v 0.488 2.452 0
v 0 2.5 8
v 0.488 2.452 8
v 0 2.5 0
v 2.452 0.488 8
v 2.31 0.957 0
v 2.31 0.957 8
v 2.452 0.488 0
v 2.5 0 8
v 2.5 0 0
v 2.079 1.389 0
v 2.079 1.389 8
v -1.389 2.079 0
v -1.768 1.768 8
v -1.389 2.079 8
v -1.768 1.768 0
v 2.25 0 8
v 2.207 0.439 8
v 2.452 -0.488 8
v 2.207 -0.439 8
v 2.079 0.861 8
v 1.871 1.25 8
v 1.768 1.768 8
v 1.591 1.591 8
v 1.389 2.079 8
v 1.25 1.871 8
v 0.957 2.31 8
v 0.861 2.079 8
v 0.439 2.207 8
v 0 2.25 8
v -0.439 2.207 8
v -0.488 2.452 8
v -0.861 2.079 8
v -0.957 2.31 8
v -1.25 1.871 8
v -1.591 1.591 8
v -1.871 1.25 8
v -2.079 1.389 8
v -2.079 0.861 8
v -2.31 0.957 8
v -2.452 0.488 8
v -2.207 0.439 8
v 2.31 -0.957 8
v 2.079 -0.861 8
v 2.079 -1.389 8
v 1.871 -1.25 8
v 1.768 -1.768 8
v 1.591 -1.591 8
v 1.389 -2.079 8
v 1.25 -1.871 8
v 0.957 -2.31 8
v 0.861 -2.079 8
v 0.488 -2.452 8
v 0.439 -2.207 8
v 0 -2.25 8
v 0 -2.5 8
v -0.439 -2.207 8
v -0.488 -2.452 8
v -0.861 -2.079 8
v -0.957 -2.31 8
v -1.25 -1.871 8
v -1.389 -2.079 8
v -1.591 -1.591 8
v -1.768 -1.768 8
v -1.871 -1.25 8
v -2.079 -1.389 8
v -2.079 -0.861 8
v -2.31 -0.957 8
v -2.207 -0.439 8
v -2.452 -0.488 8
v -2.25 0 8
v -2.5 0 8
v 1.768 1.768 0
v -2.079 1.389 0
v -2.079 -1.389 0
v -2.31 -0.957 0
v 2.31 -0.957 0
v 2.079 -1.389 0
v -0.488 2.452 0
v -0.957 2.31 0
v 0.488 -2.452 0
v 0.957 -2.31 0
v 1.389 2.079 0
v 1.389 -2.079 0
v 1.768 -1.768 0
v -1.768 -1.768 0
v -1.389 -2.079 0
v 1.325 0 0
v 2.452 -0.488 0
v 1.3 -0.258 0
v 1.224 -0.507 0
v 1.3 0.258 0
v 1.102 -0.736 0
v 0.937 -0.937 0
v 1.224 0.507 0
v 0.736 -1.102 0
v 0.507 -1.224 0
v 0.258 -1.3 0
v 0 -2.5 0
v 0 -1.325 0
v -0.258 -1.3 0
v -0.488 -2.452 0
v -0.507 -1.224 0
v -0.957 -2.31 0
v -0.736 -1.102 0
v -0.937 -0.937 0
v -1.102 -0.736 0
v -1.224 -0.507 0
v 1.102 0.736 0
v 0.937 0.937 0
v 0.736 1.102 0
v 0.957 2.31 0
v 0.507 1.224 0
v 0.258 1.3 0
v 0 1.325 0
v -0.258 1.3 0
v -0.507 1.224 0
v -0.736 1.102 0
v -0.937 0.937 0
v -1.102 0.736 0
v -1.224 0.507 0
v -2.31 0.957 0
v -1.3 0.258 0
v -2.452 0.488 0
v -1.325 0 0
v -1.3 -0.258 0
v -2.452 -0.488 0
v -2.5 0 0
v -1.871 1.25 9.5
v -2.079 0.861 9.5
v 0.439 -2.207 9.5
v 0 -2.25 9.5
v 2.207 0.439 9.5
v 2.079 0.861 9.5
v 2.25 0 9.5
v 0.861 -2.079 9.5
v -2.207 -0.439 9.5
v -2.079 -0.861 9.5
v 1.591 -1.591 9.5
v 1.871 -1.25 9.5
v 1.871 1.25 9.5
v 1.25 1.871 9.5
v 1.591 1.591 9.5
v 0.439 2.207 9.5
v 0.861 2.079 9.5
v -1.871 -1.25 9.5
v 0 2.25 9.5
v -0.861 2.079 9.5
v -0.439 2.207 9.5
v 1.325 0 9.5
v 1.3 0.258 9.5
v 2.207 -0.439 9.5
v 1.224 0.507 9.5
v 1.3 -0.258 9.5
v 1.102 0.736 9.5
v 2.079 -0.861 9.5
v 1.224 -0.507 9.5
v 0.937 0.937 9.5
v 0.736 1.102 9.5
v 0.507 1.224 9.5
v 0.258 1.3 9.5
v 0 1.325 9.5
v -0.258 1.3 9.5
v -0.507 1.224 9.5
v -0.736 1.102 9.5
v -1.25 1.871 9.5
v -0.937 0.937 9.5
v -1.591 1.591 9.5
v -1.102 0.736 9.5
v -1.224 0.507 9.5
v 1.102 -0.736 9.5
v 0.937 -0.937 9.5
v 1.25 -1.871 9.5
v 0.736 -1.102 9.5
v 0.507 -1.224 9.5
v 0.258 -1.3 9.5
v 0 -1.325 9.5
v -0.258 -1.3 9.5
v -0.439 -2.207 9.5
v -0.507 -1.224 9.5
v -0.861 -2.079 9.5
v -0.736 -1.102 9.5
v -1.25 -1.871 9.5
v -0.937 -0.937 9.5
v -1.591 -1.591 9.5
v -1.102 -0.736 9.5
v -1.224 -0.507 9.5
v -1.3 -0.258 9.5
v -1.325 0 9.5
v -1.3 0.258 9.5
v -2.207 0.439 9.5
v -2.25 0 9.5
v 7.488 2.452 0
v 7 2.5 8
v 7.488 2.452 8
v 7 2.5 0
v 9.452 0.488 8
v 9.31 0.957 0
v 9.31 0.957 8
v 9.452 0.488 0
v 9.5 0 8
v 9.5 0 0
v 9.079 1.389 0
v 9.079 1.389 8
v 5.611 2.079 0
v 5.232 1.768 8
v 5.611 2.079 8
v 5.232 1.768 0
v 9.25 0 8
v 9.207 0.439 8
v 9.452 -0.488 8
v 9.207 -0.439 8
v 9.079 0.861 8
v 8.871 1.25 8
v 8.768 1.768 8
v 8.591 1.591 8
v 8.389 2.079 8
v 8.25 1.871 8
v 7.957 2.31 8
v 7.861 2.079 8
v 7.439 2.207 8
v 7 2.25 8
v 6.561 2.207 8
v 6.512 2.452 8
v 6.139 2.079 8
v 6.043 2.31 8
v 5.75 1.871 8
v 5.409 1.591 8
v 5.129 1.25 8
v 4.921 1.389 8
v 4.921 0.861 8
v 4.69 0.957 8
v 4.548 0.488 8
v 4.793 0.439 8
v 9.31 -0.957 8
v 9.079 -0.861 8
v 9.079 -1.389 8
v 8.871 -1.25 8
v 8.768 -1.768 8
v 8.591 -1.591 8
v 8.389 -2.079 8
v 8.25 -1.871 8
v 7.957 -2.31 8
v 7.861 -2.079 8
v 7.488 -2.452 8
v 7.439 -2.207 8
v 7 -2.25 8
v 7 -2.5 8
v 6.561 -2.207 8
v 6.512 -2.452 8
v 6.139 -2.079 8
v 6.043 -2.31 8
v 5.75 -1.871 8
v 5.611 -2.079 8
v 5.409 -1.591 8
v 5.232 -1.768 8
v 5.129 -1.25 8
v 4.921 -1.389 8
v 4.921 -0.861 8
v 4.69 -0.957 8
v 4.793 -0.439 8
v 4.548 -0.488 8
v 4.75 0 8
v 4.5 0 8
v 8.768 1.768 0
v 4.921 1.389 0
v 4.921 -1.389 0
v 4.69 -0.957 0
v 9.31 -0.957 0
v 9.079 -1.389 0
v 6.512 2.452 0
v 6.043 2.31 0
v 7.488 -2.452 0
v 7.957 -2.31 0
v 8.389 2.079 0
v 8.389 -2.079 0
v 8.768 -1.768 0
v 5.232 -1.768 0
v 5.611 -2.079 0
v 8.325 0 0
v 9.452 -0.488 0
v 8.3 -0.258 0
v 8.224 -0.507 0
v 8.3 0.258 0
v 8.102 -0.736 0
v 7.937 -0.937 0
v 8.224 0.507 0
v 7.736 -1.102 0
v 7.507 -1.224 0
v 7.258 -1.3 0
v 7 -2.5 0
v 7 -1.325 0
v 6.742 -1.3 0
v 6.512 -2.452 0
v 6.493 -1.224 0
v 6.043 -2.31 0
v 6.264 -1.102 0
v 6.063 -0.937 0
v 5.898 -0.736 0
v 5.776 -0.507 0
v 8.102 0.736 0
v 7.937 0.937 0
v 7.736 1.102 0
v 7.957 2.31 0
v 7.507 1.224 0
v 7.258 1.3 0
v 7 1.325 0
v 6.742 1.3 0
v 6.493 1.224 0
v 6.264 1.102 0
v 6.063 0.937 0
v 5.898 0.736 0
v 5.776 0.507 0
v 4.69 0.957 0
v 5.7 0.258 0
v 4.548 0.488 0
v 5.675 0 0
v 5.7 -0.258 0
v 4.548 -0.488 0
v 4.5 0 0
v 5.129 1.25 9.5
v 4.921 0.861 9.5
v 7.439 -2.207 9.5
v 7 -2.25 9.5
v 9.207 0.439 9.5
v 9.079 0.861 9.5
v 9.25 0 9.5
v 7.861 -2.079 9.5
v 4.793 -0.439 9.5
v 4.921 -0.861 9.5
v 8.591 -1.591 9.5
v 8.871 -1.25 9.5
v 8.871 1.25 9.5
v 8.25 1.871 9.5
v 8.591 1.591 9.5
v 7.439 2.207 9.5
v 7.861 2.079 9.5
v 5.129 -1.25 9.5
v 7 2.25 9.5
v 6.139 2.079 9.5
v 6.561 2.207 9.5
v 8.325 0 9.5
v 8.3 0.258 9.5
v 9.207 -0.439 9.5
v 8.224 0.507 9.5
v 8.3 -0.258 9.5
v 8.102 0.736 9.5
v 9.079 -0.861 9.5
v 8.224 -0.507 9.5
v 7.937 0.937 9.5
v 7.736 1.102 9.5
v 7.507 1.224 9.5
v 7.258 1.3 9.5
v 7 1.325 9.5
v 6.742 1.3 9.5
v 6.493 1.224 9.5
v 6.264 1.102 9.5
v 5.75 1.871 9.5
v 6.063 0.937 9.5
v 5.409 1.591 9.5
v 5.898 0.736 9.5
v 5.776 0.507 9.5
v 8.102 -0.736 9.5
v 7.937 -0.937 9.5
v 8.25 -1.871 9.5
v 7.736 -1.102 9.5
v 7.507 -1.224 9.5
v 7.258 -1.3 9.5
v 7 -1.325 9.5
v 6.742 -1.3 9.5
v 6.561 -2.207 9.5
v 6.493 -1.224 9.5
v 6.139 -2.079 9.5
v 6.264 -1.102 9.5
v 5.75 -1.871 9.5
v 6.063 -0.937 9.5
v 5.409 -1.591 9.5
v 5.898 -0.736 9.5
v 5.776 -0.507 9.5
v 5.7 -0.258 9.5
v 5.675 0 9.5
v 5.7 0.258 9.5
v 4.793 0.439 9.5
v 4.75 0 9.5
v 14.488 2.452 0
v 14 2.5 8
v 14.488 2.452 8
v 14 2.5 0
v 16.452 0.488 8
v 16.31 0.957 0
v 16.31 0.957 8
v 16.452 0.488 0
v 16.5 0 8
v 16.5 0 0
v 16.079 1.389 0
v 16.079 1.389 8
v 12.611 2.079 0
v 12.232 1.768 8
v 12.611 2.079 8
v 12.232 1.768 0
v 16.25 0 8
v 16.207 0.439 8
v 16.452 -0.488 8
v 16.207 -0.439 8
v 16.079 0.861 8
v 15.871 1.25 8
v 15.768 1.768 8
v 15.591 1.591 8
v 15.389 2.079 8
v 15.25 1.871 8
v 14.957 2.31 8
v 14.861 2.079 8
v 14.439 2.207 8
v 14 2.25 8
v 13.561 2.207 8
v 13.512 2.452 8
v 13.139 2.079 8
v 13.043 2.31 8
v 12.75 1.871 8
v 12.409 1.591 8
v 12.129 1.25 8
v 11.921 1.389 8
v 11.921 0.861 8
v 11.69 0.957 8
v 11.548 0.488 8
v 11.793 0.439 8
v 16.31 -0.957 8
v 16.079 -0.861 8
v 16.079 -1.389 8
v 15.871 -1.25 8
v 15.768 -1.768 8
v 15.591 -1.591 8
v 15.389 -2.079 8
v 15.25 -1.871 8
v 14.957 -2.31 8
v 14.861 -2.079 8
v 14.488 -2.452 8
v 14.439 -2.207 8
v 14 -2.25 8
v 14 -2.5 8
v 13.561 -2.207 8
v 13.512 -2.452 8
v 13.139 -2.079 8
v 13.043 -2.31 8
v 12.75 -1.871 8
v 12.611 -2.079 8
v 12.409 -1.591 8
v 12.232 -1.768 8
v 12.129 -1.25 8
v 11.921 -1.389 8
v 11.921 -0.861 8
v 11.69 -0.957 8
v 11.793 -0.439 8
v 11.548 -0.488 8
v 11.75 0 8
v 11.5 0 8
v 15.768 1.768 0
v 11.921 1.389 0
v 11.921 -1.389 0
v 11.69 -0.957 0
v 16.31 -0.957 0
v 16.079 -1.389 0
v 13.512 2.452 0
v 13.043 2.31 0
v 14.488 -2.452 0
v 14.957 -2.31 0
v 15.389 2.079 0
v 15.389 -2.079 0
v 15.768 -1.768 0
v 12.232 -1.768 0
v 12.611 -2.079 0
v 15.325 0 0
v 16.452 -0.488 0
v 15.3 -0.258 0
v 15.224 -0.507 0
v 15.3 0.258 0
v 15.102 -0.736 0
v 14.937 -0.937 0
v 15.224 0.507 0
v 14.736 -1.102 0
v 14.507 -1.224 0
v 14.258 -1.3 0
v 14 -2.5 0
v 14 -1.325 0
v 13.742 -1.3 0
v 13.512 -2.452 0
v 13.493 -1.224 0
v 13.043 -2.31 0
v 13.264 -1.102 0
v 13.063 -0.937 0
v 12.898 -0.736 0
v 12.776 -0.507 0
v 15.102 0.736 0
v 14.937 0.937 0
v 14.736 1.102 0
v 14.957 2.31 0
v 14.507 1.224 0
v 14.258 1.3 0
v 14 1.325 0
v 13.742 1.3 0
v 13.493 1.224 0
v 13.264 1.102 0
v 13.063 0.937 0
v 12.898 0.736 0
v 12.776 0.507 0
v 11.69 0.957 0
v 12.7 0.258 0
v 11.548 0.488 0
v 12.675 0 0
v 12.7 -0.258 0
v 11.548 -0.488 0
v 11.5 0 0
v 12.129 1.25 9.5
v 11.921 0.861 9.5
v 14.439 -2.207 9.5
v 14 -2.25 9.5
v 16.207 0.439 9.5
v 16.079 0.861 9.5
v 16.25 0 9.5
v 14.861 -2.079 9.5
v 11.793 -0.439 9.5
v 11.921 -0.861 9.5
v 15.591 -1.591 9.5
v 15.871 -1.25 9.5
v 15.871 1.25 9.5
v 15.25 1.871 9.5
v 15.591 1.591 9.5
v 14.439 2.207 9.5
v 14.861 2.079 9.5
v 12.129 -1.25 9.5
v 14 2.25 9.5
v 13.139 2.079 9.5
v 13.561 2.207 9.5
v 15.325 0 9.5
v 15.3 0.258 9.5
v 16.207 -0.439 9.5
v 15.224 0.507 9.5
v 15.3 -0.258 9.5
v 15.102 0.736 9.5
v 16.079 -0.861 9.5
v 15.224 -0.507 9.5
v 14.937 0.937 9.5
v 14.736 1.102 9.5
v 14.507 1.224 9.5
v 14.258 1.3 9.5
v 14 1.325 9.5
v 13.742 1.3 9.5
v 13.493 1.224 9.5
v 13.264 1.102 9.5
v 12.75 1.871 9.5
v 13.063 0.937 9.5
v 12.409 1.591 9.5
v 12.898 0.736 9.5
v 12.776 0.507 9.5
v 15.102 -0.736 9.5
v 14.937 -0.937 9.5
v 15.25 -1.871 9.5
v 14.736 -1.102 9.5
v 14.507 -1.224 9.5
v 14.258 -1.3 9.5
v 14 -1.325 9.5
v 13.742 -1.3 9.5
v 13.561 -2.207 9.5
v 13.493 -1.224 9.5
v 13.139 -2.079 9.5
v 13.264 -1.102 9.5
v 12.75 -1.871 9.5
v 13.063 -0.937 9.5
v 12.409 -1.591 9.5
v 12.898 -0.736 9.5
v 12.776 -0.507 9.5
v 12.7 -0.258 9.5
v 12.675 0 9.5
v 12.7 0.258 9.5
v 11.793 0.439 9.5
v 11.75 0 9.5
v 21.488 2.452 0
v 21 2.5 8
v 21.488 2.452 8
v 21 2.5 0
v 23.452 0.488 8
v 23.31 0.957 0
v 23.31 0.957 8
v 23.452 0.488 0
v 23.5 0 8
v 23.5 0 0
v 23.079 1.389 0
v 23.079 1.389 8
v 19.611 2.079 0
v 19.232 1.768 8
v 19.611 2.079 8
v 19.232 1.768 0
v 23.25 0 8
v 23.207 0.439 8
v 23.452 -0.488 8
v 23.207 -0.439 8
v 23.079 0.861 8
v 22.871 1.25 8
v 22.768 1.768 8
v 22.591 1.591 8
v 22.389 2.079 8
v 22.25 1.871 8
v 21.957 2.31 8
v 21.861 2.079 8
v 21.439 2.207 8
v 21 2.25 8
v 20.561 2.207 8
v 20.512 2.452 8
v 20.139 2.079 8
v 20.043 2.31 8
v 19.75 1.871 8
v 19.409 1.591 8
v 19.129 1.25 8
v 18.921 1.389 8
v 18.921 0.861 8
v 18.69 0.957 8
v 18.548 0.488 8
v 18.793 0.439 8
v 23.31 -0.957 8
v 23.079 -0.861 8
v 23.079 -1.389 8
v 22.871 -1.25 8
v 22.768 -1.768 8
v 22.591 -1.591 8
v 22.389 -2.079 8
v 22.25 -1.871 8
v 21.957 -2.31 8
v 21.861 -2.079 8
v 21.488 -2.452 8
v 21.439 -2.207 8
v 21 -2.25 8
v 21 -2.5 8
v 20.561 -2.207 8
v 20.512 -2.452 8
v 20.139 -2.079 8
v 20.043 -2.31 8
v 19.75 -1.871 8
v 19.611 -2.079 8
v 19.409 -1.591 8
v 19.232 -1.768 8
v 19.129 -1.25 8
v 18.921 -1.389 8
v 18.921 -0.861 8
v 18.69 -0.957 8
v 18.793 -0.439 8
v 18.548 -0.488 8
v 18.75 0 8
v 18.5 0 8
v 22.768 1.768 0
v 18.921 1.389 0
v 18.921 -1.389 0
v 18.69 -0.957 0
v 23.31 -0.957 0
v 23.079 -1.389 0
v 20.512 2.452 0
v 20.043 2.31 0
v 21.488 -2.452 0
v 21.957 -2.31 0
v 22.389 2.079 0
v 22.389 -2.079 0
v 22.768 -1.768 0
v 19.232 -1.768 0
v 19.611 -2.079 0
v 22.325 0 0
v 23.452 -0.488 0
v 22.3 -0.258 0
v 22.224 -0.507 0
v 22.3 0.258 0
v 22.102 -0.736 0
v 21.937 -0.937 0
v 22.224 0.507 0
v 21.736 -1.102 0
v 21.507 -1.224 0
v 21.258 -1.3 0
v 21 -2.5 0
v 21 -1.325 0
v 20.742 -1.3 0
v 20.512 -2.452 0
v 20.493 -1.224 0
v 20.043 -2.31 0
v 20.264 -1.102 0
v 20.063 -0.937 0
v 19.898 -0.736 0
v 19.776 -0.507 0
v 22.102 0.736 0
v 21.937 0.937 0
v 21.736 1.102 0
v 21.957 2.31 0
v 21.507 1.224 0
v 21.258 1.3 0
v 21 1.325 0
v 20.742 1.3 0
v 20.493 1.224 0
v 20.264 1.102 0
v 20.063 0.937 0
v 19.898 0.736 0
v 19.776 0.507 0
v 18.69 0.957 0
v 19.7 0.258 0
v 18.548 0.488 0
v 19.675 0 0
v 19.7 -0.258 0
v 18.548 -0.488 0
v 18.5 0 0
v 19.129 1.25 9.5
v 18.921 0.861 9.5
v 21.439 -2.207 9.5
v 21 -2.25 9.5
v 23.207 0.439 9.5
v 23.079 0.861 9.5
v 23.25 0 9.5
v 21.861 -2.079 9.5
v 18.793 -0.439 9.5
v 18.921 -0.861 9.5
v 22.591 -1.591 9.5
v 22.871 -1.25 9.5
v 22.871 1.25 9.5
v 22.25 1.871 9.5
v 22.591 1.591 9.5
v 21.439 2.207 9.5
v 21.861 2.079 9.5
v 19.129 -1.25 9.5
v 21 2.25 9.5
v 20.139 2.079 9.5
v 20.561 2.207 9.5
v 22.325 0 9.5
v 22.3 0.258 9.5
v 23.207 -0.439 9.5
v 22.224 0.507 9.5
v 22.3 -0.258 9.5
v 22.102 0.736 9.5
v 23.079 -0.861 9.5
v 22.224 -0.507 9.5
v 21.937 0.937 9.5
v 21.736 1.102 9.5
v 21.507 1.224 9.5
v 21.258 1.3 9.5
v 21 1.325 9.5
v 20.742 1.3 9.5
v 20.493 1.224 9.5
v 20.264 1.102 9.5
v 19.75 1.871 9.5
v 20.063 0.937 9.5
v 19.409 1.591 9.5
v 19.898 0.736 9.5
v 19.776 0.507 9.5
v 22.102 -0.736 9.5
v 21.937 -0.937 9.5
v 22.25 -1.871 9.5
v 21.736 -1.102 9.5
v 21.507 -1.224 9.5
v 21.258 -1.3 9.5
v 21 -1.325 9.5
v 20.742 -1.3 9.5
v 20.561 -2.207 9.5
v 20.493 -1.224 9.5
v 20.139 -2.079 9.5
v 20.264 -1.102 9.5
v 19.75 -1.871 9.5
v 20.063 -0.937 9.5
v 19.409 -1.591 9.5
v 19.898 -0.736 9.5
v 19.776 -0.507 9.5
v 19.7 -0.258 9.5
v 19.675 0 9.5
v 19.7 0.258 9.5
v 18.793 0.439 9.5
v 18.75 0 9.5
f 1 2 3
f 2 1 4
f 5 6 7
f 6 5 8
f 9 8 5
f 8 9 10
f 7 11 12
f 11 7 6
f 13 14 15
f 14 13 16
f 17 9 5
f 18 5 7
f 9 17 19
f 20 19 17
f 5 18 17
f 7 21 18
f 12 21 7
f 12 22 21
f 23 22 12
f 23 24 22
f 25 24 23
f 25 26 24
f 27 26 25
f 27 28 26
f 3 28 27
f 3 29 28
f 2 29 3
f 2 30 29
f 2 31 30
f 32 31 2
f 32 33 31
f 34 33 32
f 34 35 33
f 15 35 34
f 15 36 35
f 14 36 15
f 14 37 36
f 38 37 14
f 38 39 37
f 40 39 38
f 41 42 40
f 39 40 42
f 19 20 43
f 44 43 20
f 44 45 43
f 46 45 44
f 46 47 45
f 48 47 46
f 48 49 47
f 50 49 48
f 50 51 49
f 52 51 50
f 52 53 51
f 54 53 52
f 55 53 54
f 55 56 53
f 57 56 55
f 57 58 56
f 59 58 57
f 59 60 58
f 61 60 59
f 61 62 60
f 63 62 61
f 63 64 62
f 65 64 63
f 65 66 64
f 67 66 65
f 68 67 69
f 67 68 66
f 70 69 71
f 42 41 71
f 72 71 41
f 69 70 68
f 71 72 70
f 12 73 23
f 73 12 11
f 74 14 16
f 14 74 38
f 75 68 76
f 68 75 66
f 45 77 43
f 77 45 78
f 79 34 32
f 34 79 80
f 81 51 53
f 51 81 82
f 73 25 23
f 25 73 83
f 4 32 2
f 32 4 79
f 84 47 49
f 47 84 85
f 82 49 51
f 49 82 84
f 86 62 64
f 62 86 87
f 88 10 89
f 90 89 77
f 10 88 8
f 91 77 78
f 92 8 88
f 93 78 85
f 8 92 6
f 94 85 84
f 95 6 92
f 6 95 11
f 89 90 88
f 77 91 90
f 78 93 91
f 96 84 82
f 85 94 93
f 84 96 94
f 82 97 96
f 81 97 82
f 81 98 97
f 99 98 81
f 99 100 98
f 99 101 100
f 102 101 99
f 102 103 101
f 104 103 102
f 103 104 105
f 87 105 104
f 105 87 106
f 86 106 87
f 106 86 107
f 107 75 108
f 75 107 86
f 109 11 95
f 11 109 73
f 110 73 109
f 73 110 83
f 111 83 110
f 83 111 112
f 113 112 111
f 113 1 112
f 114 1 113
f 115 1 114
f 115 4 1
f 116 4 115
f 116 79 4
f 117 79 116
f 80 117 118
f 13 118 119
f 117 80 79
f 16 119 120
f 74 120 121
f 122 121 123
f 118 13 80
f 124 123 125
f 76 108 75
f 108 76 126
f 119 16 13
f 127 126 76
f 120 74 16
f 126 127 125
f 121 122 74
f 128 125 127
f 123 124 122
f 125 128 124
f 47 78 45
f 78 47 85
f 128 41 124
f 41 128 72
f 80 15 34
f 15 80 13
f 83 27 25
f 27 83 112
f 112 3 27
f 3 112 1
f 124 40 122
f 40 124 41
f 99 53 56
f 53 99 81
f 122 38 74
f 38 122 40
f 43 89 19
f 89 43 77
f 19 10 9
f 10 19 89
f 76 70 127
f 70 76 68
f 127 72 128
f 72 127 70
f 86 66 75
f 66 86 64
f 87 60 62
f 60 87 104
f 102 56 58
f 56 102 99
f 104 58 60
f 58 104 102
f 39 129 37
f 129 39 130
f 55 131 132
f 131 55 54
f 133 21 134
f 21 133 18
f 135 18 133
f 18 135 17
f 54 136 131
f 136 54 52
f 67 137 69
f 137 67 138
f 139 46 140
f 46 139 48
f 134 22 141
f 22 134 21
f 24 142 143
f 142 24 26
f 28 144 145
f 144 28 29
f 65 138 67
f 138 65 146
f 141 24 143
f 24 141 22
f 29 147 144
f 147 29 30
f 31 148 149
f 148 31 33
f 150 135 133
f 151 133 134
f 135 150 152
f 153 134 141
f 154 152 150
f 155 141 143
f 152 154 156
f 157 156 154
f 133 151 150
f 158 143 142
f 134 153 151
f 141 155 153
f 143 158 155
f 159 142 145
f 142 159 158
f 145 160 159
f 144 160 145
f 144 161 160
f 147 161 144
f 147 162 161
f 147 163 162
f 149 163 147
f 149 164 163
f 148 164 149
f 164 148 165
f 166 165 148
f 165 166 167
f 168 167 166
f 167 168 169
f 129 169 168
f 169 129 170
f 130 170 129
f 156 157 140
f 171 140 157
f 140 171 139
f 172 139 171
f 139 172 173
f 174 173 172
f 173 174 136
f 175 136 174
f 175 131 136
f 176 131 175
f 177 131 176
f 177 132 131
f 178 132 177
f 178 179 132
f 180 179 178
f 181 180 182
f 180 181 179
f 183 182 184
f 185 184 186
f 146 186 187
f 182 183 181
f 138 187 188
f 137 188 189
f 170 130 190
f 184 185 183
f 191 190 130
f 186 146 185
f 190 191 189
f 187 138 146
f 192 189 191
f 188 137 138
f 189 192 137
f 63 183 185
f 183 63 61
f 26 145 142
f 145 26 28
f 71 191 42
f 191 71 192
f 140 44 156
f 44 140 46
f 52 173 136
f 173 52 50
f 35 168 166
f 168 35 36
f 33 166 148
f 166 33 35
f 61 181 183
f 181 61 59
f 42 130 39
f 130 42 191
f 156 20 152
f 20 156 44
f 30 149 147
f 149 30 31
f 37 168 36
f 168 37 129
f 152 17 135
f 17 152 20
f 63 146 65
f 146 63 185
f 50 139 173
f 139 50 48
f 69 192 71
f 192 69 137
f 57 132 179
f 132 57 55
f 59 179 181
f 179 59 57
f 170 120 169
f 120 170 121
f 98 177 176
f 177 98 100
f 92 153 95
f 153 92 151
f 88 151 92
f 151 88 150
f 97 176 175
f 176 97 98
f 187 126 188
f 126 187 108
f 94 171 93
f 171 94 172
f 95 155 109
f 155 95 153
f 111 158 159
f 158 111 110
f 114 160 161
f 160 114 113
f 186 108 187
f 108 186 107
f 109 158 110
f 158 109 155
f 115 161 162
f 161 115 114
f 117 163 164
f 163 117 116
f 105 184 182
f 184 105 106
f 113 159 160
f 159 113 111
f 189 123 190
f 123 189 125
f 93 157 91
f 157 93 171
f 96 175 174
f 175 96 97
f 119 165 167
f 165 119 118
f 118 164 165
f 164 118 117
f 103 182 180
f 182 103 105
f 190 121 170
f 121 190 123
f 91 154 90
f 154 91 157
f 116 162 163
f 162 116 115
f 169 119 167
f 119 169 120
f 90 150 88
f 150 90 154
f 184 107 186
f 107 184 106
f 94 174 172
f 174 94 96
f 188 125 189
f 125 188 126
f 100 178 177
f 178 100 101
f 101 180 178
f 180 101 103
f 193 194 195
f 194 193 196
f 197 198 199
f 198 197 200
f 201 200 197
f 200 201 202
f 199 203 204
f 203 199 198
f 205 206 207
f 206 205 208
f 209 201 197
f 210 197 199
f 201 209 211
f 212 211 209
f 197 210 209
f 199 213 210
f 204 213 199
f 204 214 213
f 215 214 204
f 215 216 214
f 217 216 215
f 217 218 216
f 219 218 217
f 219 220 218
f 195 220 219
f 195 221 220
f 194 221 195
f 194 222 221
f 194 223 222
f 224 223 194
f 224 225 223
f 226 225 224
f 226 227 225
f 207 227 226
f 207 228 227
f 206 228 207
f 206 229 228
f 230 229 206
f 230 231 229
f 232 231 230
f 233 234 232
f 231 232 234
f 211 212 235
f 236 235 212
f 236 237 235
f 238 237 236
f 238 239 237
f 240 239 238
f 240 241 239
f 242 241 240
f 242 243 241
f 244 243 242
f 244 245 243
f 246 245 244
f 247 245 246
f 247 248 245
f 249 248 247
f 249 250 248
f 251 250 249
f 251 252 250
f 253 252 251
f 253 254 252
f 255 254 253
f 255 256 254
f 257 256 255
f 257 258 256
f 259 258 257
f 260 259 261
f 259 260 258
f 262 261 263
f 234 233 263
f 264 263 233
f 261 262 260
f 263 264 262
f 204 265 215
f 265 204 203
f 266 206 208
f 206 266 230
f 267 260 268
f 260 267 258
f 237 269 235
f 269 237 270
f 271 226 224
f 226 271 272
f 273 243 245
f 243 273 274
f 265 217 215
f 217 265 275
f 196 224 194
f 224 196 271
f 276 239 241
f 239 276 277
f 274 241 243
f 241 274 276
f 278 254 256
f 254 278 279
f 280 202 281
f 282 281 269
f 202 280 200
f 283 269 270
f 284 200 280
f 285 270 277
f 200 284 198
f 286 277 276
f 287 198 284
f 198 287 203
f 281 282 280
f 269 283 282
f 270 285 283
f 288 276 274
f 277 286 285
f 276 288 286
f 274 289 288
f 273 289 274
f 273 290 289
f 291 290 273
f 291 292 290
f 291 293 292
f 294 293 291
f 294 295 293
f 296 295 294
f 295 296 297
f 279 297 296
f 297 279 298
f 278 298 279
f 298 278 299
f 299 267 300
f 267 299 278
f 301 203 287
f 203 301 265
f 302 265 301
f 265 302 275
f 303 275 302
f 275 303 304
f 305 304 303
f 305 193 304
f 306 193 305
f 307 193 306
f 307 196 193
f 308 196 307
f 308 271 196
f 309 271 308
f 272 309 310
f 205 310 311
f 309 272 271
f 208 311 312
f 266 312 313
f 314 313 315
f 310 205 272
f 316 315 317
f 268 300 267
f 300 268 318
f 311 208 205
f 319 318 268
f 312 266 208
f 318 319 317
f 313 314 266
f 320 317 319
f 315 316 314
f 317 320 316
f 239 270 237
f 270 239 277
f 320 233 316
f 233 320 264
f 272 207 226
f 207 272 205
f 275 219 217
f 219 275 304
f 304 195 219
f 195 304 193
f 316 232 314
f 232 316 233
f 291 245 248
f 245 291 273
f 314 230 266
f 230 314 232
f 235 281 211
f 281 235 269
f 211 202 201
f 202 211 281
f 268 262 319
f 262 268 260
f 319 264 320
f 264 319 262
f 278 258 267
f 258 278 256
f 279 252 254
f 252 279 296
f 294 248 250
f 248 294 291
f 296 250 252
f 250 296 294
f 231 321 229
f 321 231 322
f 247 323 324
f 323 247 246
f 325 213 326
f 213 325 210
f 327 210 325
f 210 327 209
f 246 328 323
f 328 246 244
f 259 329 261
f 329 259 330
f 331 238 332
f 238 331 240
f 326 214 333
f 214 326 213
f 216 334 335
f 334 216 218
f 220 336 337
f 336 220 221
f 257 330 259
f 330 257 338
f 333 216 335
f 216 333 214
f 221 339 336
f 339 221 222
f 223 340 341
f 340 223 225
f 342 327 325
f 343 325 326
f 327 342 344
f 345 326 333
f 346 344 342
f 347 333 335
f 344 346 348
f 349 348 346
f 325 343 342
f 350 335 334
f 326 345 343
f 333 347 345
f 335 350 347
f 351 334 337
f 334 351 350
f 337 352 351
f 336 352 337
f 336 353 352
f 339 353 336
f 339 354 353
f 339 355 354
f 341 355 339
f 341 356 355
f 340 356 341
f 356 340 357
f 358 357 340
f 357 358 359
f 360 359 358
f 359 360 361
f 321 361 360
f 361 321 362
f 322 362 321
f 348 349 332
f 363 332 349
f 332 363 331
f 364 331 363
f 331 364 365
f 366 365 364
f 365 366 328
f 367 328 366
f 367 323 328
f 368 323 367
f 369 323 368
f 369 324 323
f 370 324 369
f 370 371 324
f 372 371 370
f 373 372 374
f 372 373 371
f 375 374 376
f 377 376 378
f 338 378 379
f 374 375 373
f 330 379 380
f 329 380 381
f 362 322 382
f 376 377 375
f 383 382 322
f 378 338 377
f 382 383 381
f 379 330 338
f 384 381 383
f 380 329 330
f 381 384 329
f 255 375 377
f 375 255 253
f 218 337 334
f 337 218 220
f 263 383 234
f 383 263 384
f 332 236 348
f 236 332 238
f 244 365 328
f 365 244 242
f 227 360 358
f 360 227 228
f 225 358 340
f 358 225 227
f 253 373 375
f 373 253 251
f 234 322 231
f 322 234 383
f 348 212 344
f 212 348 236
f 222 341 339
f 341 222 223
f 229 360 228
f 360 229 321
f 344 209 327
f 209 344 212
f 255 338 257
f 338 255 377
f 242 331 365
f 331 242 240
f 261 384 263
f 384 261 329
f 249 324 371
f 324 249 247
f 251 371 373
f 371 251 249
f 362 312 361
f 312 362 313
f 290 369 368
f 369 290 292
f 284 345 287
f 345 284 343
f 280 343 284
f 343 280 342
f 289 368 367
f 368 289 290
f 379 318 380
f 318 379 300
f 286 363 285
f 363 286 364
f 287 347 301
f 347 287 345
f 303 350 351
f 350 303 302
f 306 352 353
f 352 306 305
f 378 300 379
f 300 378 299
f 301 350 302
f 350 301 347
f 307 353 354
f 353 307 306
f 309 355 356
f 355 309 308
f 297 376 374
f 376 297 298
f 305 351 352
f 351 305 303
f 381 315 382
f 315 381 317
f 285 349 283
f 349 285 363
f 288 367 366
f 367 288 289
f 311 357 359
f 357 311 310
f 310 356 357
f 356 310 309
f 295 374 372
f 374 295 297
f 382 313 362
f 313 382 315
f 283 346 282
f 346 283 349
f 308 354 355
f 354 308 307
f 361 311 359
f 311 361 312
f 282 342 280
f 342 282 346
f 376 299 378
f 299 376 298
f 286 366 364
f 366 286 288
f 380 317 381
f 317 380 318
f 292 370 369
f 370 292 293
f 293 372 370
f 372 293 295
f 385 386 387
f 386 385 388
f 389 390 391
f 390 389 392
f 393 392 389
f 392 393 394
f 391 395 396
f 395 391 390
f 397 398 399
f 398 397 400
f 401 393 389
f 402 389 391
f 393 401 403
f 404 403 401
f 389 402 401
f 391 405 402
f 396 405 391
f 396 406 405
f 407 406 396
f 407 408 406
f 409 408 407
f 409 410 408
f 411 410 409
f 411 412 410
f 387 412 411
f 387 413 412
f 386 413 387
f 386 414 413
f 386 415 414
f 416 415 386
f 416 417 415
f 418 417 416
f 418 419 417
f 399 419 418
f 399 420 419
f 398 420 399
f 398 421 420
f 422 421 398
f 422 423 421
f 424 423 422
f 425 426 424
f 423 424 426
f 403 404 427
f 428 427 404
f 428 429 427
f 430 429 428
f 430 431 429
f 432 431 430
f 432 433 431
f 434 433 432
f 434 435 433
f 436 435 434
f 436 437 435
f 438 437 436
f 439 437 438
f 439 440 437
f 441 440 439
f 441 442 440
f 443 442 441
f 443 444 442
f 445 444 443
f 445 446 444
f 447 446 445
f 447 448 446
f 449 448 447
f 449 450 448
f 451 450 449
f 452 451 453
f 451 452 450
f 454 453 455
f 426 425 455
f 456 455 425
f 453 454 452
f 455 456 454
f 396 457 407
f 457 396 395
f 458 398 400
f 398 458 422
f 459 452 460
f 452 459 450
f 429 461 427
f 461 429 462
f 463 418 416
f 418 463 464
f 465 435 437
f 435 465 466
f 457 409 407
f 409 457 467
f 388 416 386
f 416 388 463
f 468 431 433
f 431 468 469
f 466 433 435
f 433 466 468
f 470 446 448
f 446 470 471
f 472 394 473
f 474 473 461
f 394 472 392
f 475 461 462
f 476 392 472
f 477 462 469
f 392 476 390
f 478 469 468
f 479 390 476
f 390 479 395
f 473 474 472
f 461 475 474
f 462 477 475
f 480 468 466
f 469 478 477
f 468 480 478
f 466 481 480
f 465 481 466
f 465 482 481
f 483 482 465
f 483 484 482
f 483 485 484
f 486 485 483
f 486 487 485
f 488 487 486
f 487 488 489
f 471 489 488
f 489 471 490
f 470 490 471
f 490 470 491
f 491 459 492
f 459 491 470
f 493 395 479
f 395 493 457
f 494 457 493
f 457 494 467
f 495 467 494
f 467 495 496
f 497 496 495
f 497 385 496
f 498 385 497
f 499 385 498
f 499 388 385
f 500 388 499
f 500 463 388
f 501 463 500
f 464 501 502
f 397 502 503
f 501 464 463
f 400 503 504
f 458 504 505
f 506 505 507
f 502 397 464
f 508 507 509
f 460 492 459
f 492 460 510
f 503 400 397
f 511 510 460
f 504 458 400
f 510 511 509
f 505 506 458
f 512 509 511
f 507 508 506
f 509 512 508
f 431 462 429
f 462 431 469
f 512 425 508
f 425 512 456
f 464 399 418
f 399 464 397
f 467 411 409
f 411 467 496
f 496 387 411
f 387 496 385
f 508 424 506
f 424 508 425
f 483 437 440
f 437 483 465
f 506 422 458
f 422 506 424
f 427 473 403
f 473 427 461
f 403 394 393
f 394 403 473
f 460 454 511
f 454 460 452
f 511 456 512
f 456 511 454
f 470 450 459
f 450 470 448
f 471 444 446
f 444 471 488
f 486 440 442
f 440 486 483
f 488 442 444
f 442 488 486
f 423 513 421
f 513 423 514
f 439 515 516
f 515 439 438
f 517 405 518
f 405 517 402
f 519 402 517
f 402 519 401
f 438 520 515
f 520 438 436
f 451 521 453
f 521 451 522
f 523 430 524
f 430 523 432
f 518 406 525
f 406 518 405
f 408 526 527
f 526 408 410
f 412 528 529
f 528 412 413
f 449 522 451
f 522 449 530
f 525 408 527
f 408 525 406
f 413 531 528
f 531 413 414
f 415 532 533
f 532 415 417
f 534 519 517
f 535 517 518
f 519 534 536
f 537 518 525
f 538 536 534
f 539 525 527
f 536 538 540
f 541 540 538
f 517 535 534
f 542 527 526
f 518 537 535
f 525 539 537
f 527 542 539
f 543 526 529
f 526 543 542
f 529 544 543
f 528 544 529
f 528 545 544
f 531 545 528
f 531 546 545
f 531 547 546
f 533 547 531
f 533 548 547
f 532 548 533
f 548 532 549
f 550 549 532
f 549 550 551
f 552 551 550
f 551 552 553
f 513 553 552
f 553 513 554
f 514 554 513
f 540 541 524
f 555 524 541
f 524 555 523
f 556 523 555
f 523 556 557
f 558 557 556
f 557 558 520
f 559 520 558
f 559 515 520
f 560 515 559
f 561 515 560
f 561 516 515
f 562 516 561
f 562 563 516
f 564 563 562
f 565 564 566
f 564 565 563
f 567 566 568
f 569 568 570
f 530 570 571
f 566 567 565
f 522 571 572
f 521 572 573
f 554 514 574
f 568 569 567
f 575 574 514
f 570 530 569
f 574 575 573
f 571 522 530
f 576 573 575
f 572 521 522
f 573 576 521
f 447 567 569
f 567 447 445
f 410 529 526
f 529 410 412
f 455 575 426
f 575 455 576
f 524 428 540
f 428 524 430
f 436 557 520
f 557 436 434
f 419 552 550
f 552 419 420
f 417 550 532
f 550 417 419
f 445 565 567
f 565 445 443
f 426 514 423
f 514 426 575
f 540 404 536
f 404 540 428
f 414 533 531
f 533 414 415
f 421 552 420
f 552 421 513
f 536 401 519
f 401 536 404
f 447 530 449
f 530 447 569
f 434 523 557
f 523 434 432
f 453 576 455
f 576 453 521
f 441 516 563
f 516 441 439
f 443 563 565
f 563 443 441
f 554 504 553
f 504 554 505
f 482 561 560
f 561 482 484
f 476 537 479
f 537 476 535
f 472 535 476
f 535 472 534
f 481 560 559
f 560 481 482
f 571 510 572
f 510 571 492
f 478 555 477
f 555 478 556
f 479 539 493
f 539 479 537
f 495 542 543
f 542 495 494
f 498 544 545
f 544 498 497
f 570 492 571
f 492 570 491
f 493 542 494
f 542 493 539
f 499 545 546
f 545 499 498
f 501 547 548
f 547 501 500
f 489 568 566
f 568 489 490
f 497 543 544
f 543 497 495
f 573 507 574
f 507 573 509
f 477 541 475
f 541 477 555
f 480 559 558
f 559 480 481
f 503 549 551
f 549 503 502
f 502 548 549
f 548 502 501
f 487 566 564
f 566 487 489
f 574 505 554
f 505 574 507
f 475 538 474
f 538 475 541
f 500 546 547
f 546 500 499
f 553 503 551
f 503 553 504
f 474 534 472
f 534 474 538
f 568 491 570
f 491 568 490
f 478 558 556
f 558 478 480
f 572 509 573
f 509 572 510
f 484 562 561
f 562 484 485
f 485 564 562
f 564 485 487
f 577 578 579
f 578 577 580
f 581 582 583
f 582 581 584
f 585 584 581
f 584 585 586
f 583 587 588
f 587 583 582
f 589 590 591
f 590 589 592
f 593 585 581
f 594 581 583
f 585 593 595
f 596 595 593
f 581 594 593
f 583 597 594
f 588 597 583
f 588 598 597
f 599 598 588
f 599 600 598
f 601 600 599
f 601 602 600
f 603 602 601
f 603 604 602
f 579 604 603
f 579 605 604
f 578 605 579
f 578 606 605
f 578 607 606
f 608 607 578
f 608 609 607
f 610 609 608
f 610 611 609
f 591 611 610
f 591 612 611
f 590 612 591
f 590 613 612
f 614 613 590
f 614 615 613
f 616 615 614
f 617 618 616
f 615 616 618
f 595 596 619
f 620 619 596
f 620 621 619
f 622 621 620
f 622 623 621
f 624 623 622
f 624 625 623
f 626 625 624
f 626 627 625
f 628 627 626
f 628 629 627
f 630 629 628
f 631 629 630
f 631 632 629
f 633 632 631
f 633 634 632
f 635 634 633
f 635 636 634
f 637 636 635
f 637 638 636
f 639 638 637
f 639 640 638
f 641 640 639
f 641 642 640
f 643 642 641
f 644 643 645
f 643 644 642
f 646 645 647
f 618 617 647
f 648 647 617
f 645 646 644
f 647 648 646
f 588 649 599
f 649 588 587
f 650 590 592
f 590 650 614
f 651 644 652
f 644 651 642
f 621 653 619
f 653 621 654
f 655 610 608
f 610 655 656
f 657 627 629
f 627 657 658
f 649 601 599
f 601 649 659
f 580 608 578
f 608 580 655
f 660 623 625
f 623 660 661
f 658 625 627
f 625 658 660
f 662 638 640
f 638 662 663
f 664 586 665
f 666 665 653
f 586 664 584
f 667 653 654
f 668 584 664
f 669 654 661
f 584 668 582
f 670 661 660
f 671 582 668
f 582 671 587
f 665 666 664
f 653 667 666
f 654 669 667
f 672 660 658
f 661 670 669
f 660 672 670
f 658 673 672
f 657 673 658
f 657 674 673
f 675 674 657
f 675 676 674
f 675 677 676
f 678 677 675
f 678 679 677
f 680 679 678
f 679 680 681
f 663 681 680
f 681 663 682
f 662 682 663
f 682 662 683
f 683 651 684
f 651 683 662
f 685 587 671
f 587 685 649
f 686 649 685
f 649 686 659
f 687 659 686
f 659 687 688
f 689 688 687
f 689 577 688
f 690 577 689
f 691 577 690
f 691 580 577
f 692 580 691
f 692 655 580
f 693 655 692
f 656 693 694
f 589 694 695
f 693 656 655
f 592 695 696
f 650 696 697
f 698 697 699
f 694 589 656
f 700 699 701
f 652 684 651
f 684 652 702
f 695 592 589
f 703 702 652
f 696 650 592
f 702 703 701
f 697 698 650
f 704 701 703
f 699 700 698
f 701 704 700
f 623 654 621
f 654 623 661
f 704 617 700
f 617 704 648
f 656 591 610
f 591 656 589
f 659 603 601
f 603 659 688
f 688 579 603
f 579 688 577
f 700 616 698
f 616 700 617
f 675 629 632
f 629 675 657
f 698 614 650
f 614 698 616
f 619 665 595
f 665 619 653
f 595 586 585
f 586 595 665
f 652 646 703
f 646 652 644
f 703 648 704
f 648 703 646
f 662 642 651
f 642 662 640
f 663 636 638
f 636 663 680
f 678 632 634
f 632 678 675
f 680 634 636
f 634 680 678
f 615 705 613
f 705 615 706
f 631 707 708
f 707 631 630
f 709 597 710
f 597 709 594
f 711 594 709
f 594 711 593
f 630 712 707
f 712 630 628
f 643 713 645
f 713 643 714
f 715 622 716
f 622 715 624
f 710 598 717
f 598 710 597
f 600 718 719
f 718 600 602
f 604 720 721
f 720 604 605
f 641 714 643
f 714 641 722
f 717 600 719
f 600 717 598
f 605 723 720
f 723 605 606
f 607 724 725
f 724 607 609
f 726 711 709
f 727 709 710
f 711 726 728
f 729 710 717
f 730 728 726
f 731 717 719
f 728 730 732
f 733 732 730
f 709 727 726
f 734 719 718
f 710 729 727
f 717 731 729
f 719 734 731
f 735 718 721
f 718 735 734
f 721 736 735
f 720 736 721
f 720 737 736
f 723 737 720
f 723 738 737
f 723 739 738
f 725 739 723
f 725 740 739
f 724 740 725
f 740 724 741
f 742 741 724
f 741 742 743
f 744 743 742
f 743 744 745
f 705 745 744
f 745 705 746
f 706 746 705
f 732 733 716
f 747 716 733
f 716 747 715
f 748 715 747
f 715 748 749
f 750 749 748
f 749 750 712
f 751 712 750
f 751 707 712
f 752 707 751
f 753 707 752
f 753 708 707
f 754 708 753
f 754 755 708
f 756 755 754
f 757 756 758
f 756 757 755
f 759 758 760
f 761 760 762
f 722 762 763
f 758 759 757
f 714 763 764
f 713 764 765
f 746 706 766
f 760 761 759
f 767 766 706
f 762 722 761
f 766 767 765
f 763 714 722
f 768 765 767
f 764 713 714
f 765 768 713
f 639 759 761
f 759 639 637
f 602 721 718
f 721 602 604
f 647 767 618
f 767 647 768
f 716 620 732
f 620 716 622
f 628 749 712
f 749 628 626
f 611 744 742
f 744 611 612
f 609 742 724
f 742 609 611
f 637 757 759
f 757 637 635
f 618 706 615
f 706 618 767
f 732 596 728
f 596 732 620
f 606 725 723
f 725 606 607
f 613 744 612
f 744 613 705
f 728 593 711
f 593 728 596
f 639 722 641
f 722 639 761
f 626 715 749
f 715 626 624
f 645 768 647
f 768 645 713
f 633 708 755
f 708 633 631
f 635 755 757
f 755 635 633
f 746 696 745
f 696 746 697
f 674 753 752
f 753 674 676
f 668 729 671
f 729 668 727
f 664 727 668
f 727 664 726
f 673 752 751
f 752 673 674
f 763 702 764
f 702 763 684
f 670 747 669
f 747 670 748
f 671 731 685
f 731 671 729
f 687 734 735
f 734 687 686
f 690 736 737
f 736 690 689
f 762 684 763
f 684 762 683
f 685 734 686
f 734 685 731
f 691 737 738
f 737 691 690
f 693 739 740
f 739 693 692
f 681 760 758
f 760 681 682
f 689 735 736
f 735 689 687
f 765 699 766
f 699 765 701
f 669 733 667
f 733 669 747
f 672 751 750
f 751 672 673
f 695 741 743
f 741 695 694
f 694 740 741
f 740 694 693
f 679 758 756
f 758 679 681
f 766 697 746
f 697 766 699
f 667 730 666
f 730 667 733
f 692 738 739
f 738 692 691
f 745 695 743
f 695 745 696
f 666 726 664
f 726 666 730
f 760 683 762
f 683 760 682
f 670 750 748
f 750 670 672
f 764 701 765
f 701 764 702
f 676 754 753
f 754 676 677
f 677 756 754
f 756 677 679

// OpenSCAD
// file: adafruit_lsm9ds0_pcb.scad
// Adafruit LSM9DS0 9-DOF Breakout Board PCB Model
// Based on Adafruit-LSM9DS0-PCB design files
// https://github.com/adafruit/Adafruit-LSM9DS0-PCB
//
// License: Creative Commons Attribution-ShareAlike 3.0
// Designed by Limor Fried/Ladyada for Adafruit Industries
// OpenSCAD model created for ekf9dof project

// Parameters - all dimensions from Adafruit Eagle PCB files
pcb_length = 33.02;      // X dimension from Eagle board file
pcb_width = 20.32;       // Y dimension from Eagle board file  
pcb_thickness = 1.6;     // Standard PCB thickness
hole_diameter = 2.5;     // Mounting hole drill diameter from .brd file
hole_positions = [
    [2.54, 2.54],        // Bottom left corner
    [30.48, 2.54],       // Bottom right corner
    [2.54, 17.78],       // Top left corner
    [30.48, 17.78]       // Top right corner
];

// Component dimensions (approximated from board layout)
lsm9ds0_chip_size = [4, 4, 1];  // LGA-24 4x4mm package
chip_position = [pcb_length/2, pcb_width/2, pcb_thickness];

// Connector positions (from board file - 1x9 power/IO header and 1x5 SPI header)
header_1x9_position = [16.51, 2.54, pcb_thickness];
header_1x5_position = [16.51, 17.78, pcb_thickness];
pin_size = [0.64, 0.64, 11.43];  // Square pin 0.64mm, 11.43mm height

// Module: Complete Adafruit LSM9DS0 PCB assembly
module adafruit_lsm9ds0_pcb(show_components = true, pcb_color = "#2196F3") {
    
    // PCB base
    difference() {
        union() {
            // Main PCB board
            color(pcb_color)
            linear_extrude(height = pcb_thickness)
            difference() {
                // PCB outline
                square([pcb_length, pcb_width]);
                
                // Mounting holes
                for (pos = hole_positions) {
                    translate(pos)
                    circle(d = hole_diameter, $fn = 32);
                }
            }
        }
    }
    
    if (show_components) {
        // LSM9DS0 IC chip (center of board)
        color("dimgray")
        translate(chip_position)
        cube(lsm9ds0_chip_size, center = true);
        
        // Pin 1 indicator dot
        color("white")
        translate([chip_position[0] - lsm9ds0_chip_size[0]/2 + 0.5, 
                   chip_position[1] - lsm9ds0_chip_size[1]/2 + 0.5, 
                   chip_position[2] + lsm9ds0_chip_size[2]])
        cylinder(d = 0.6, h = 0.1, $fn = 16);
        
        // 1x9 Pin header (bottom - power and GPIO)
        color("black")
        translate(header_1x9_position)
        for (i = [-4:4]) {
            translate([i * 2.54, 0, 0])
            cube(pin_size, center = true);
        }
        
        // 1x5 Pin header (top - SPI interface)
        color("black")
        translate(header_1x5_position)
        for (i = [-2:2]) {
            translate([i * 2.54, 0, 0])
            cube(pin_size, center = true);
        }
        
        // Voltage regulator (approximate position from layout)
        color("darkslategray")
        translate([8.89, 10.16, pcb_thickness])
        cube([2.9, 1.6, 1.2], center = true);
        
        // Level shifter MOSFETs (approximate positions)
        for (x_offset = [12.7, 15.24, 17.78]) {
            color("darkslategray")
            translate([x_offset, 6.858, pcb_thickness])
            cube([1.3, 2.5, 0.9], center = true);
        }
        
        // SMD capacitors and resistors (simplified representation)
        for (pos = [[6.35, 12.7], [24.892, 11.938], [12.192, 14.351]]) {
            color("sienna")
            translate([pos[0], pos[1], pcb_thickness])
            cube([2.0, 1.25, 0.6], center = true);
        }
    }
}

// Render the PCB
adafruit_lsm9ds0_pcb(show_components = true);

// Print board information
echo("=== Adafruit LSM9DS0 PCB ===");
echo(str("Board size: ", pcb_length, "mm x ", pcb_width, "mm x ", pcb_thickness, "mm"));
echo(str("Mounting holes: ", hole_diameter, "mm diameter"));
echo("Mounting hole positions (X, Y):");
for (i = [0:len(hole_positions)-1]) {
    echo(str("  Hole ", i+1, ": (", hole_positions[i][0], ", ", hole_positions[i][1], ")"));
}
echo("Sensor: LSM9DS0 9-DOF (3-axis accelerometer, magnetometer, gyroscope)");
echo("Headers: 1x9 pin (Power/GPIO), 1x5 pin (SPI)");
echo("License: CC-BY-SA 3.0 - Adafruit Industries");
// main file
// Adafruit LSM9DS0 IMU Mounting Fixture
// Mounting system with standoffs and base plate
// Uses reusable hole pattern for chassis/wall mounting
//
// OpenSCAD model created for ekf9dof project

use <adafruit_lsm9ds0_pcb.scad>

// ===== MOUNTING PARAMETERS =====

// PCB dimensions (from adafruit_lsm9ds0_pcb.scad)
pcb_length = 33.02;
pcb_width = 20.32;
pcb_hole_diameter = 2.5;
pcb_hole_positions = [
    [2.54, 2.54],
    [30.48, 2.54],
    [2.54, 17.78],
    [30.48, 17.78]
];

// Standoff parameters
standoff_height = 8;              // Height above base plate
standoff_outer_diameter = 5;      // Outer diameter of standoff
standoff_inner_diameter = 2.65;   // Inner diameter for M2.5 screw (clearance)
standoff_top_diameter = 4.5;      // Top platform diameter for PCB mounting

// Base plate parameters
base_plate_length = 50;           // Base plate X dimension
base_plate_width = 40;            // Base plate Y dimension
base_plate_thickness = 3;         // Base plate thickness
base_plate_corner_radius = 2;     // Rounded corners

// Chassis mounting hole pattern (4-hole pattern on base plate)
chassis_hole_diameter = 2.65;     // M2.5 clearance holes
chassis_hole_spacing = 32;        // Distance between holes (center-to-center)
chassis_hole_inset = 4;           // Distance from edge to hole center

// Hardware tolerances
screw_tolerance = 0.15;           // Extra clearance for screws

// ===== REUSABLE MOUNTING HOLE PATTERN MODULE =====

// Module: Creates a 4-hole mounting pattern (rectangular)
// This pattern can be used to:
//   1. Create mounting holes in the base plate (positive)
//   2. Create matching holes in chassis/walls (negative)
//   3. Ensure perfect alignment between mount and chassis
//
// Parameters:
//   hole_d = hole diameter
//   spacing_x = horizontal spacing between holes
//   spacing_y = vertical spacing between holes
//   depth = hole depth (use large value for through-holes)
module mounting_hole_pattern_4(hole_d = 3.2, spacing_x = 32, spacing_y = 20, depth = 10) {
    // Calculate positions for 4-hole rectangular pattern
    x_offset = spacing_x / 2;
    y_offset = spacing_y / 2;
    
    positions = [
        [-x_offset, -y_offset],  // Bottom left
        [ x_offset, -y_offset],  // Bottom right
        [-x_offset,  y_offset],  // Top left
        [ x_offset,  y_offset]   // Top right
    ];
    
    for (pos = positions) {
        translate([pos[0], pos[1], 0])
        cylinder(d = hole_d, h = depth, center = true, $fn = 32);
    }
}

// ===== IMU MOUNT COMPONENTS =====

// Module: Single standoff for PCB mounting
module pcb_standoff() {
    difference() {
        union() {
            // Main standoff column
            cylinder(d = standoff_outer_diameter, h = standoff_height, $fn = 32);
            
            // Top platform for PCB support
            translate([0, 0, standoff_height])
            cylinder(d = standoff_top_diameter, h = 1.5, $fn = 32);
        }
        
        // Through-hole for M2.5 screw (bottom to top)
        translate([0, 0, -0.1])
        cylinder(d = standoff_inner_diameter, h = standoff_height + 2, $fn = 32);
    }
}

// Module: Base plate with standoff mounting points and chassis holes
module base_plate() {
    difference() {
        // Base plate body with rounded corners
        translate([0, 0, base_plate_thickness/2])
        linear_extrude(height = base_plate_thickness, center = true)
        offset(r = base_plate_corner_radius)
        offset(r = -base_plate_corner_radius)
        square([base_plate_length, base_plate_width], center = true);
        
        // Chassis mounting holes (4-hole pattern)
        translate([0, 0, base_plate_thickness/2])
        mounting_hole_pattern_4(
            hole_d = chassis_hole_diameter,
            spacing_x = chassis_hole_spacing,
            spacing_y = base_plate_width - 2 * chassis_hole_inset,
            depth = base_plate_thickness + 1
        );
        
        // PCB standoff mounting holes (countersunk for M2.5 screws from bottom)
        for (pos = pcb_hole_positions) {
            // Center the PCB hole pattern on the base plate
            translate([pos[0] - pcb_length/2, pos[1] - pcb_width/2, -0.1]) {
                // Through hole for screw shaft
                cylinder(d = standoff_inner_diameter, h = base_plate_thickness + 0.2, $fn = 32);
                
                // Countersink for screw head (from bottom)
                translate([0, 0, -0.1])
                cylinder(d1 = 5.5, d2 = standoff_inner_diameter, h = 2, $fn = 32);
            }
        }
    }
}

// ===== COMPLETE IMU MOUNT ASSEMBLY =====

// Module: Complete IMU mount with base plate and standoffs
module imu_mount_assembly(show_pcb = false, explode = 0) {
    
    // Base plate
    color("lightgray")
    base_plate();
    
    // PCB standoffs
    color("silver")
    for (pos = pcb_hole_positions) {
        translate([pos[0] - pcb_length/2, pos[1] - pcb_width/2, base_plate_thickness])
        pcb_standoff();
    }
    
    // Optional: Show PCB for fit check
    if (show_pcb) {
        translate([0, 0, base_plate_thickness + standoff_height + 1.5 + explode])
        translate([-pcb_length/2, -pcb_width/2, 0])
        adafruit_lsm9ds0_pcb(show_components = true);
    }
}

// ===== HELPER MODULE FOR CHASSIS CUTOUT =====

// Module: Generate matching hole pattern in chassis/wall
// Use this with difference() to cut mounting holes in your chassis
module chassis_mounting_pattern(wall_thickness = 3, hole_d = 2.65) {
    mounting_hole_pattern_4(
        hole_d = hole_d,
        spacing_x = chassis_hole_spacing,
        spacing_y = base_plate_width - 2 * chassis_hole_inset,
        depth = wall_thickness + 1
    );
}

// ===== EXAMPLE CHASSIS WALL WITH MOUNTING HOLES =====

// Module: Example chassis wall showing how to use the mounting pattern
module example_chassis_wall() {
    wall_thickness = 3;
    wall_size = [60, 50, wall_thickness];
    
    difference() {
        // Wall
        color("lightblue", 0.5)
        translate([0, 0, -wall_thickness])
        cube(wall_size, center = true);
        
        // Mounting holes using the pattern
        translate([0, 0, -wall_thickness/2])
        chassis_mounting_pattern(wall_thickness, chassis_hole_diameter);
    }
}

// ===== RENDER SELECTION =====

// Render options:
render_mode = "standoffs_only";  // Options: "assembly", "base_only", "standoffs_only", "with_chassis", "pattern_test"

if (render_mode == "assembly") {
    // IMU mount assembly with PCB
    imu_mount_assembly(show_pcb = true, explode = 0);
    
} else if (render_mode == "base_only") {
    // Base plate only (for 3D printing)
    base_plate();
    
} else if (render_mode == "standoffs_only") {
    // Standoffs only (for 3D printing as separate parts)
    color("silver")
    for (i = [0:len(pcb_hole_positions)-1]) {
        pos = pcb_hole_positions[i];
        // Arrange standoffs in a line for printing
        translate([i * (standoff_outer_diameter + 2), 0, 0])
        pcb_standoff();
    }
    
} else if (render_mode == "with_chassis") {
    // Show mount with example chassis wall
    imu_mount_assembly(show_pcb = true, explode = 10);
    example_chassis_wall();
    
} else if (render_mode == "pattern_test") {
    // Show just the hole patterns for verification
    color("red")
    mounting_hole_pattern_4(
        hole_d = chassis_hole_diameter,
        spacing_x = chassis_hole_spacing,
        spacing_y = base_plate_width - 2 * chassis_hole_inset,
        depth = 5
    );
}

// ===== DOCUMENTATION =====

echo("=== Adafruit LSM9DS0 IMU Mount ===");
echo(str("Base plate: ", base_plate_length, "mm x ", base_plate_width, "mm x ", base_plate_thickness, "mm"));
echo(str("Standoff height: ", standoff_height, "mm"));
echo(str("Total assembly height: ", base_plate_thickness + standoff_height + 1.5, "mm (without PCB)"));
echo("");
echo("=== Chassis Mounting Pattern ===");
echo(str("4-hole pattern: ", chassis_hole_spacing, "mm x ", base_plate_width - 2 * chassis_hole_inset, "mm"));
echo(str("Hole diameter: ", chassis_hole_diameter, "mm (M2.5 clearance)"));
echo(str("Use chassis_mounting_pattern() module to create matching holes in chassis"));
echo("");
echo("=== Hardware Required ===");
echo("4x M2.5 screws (length: ~15mm) - PCB to standoffs");
echo("4x M2.5 screws + nuts - Base plate to chassis");
